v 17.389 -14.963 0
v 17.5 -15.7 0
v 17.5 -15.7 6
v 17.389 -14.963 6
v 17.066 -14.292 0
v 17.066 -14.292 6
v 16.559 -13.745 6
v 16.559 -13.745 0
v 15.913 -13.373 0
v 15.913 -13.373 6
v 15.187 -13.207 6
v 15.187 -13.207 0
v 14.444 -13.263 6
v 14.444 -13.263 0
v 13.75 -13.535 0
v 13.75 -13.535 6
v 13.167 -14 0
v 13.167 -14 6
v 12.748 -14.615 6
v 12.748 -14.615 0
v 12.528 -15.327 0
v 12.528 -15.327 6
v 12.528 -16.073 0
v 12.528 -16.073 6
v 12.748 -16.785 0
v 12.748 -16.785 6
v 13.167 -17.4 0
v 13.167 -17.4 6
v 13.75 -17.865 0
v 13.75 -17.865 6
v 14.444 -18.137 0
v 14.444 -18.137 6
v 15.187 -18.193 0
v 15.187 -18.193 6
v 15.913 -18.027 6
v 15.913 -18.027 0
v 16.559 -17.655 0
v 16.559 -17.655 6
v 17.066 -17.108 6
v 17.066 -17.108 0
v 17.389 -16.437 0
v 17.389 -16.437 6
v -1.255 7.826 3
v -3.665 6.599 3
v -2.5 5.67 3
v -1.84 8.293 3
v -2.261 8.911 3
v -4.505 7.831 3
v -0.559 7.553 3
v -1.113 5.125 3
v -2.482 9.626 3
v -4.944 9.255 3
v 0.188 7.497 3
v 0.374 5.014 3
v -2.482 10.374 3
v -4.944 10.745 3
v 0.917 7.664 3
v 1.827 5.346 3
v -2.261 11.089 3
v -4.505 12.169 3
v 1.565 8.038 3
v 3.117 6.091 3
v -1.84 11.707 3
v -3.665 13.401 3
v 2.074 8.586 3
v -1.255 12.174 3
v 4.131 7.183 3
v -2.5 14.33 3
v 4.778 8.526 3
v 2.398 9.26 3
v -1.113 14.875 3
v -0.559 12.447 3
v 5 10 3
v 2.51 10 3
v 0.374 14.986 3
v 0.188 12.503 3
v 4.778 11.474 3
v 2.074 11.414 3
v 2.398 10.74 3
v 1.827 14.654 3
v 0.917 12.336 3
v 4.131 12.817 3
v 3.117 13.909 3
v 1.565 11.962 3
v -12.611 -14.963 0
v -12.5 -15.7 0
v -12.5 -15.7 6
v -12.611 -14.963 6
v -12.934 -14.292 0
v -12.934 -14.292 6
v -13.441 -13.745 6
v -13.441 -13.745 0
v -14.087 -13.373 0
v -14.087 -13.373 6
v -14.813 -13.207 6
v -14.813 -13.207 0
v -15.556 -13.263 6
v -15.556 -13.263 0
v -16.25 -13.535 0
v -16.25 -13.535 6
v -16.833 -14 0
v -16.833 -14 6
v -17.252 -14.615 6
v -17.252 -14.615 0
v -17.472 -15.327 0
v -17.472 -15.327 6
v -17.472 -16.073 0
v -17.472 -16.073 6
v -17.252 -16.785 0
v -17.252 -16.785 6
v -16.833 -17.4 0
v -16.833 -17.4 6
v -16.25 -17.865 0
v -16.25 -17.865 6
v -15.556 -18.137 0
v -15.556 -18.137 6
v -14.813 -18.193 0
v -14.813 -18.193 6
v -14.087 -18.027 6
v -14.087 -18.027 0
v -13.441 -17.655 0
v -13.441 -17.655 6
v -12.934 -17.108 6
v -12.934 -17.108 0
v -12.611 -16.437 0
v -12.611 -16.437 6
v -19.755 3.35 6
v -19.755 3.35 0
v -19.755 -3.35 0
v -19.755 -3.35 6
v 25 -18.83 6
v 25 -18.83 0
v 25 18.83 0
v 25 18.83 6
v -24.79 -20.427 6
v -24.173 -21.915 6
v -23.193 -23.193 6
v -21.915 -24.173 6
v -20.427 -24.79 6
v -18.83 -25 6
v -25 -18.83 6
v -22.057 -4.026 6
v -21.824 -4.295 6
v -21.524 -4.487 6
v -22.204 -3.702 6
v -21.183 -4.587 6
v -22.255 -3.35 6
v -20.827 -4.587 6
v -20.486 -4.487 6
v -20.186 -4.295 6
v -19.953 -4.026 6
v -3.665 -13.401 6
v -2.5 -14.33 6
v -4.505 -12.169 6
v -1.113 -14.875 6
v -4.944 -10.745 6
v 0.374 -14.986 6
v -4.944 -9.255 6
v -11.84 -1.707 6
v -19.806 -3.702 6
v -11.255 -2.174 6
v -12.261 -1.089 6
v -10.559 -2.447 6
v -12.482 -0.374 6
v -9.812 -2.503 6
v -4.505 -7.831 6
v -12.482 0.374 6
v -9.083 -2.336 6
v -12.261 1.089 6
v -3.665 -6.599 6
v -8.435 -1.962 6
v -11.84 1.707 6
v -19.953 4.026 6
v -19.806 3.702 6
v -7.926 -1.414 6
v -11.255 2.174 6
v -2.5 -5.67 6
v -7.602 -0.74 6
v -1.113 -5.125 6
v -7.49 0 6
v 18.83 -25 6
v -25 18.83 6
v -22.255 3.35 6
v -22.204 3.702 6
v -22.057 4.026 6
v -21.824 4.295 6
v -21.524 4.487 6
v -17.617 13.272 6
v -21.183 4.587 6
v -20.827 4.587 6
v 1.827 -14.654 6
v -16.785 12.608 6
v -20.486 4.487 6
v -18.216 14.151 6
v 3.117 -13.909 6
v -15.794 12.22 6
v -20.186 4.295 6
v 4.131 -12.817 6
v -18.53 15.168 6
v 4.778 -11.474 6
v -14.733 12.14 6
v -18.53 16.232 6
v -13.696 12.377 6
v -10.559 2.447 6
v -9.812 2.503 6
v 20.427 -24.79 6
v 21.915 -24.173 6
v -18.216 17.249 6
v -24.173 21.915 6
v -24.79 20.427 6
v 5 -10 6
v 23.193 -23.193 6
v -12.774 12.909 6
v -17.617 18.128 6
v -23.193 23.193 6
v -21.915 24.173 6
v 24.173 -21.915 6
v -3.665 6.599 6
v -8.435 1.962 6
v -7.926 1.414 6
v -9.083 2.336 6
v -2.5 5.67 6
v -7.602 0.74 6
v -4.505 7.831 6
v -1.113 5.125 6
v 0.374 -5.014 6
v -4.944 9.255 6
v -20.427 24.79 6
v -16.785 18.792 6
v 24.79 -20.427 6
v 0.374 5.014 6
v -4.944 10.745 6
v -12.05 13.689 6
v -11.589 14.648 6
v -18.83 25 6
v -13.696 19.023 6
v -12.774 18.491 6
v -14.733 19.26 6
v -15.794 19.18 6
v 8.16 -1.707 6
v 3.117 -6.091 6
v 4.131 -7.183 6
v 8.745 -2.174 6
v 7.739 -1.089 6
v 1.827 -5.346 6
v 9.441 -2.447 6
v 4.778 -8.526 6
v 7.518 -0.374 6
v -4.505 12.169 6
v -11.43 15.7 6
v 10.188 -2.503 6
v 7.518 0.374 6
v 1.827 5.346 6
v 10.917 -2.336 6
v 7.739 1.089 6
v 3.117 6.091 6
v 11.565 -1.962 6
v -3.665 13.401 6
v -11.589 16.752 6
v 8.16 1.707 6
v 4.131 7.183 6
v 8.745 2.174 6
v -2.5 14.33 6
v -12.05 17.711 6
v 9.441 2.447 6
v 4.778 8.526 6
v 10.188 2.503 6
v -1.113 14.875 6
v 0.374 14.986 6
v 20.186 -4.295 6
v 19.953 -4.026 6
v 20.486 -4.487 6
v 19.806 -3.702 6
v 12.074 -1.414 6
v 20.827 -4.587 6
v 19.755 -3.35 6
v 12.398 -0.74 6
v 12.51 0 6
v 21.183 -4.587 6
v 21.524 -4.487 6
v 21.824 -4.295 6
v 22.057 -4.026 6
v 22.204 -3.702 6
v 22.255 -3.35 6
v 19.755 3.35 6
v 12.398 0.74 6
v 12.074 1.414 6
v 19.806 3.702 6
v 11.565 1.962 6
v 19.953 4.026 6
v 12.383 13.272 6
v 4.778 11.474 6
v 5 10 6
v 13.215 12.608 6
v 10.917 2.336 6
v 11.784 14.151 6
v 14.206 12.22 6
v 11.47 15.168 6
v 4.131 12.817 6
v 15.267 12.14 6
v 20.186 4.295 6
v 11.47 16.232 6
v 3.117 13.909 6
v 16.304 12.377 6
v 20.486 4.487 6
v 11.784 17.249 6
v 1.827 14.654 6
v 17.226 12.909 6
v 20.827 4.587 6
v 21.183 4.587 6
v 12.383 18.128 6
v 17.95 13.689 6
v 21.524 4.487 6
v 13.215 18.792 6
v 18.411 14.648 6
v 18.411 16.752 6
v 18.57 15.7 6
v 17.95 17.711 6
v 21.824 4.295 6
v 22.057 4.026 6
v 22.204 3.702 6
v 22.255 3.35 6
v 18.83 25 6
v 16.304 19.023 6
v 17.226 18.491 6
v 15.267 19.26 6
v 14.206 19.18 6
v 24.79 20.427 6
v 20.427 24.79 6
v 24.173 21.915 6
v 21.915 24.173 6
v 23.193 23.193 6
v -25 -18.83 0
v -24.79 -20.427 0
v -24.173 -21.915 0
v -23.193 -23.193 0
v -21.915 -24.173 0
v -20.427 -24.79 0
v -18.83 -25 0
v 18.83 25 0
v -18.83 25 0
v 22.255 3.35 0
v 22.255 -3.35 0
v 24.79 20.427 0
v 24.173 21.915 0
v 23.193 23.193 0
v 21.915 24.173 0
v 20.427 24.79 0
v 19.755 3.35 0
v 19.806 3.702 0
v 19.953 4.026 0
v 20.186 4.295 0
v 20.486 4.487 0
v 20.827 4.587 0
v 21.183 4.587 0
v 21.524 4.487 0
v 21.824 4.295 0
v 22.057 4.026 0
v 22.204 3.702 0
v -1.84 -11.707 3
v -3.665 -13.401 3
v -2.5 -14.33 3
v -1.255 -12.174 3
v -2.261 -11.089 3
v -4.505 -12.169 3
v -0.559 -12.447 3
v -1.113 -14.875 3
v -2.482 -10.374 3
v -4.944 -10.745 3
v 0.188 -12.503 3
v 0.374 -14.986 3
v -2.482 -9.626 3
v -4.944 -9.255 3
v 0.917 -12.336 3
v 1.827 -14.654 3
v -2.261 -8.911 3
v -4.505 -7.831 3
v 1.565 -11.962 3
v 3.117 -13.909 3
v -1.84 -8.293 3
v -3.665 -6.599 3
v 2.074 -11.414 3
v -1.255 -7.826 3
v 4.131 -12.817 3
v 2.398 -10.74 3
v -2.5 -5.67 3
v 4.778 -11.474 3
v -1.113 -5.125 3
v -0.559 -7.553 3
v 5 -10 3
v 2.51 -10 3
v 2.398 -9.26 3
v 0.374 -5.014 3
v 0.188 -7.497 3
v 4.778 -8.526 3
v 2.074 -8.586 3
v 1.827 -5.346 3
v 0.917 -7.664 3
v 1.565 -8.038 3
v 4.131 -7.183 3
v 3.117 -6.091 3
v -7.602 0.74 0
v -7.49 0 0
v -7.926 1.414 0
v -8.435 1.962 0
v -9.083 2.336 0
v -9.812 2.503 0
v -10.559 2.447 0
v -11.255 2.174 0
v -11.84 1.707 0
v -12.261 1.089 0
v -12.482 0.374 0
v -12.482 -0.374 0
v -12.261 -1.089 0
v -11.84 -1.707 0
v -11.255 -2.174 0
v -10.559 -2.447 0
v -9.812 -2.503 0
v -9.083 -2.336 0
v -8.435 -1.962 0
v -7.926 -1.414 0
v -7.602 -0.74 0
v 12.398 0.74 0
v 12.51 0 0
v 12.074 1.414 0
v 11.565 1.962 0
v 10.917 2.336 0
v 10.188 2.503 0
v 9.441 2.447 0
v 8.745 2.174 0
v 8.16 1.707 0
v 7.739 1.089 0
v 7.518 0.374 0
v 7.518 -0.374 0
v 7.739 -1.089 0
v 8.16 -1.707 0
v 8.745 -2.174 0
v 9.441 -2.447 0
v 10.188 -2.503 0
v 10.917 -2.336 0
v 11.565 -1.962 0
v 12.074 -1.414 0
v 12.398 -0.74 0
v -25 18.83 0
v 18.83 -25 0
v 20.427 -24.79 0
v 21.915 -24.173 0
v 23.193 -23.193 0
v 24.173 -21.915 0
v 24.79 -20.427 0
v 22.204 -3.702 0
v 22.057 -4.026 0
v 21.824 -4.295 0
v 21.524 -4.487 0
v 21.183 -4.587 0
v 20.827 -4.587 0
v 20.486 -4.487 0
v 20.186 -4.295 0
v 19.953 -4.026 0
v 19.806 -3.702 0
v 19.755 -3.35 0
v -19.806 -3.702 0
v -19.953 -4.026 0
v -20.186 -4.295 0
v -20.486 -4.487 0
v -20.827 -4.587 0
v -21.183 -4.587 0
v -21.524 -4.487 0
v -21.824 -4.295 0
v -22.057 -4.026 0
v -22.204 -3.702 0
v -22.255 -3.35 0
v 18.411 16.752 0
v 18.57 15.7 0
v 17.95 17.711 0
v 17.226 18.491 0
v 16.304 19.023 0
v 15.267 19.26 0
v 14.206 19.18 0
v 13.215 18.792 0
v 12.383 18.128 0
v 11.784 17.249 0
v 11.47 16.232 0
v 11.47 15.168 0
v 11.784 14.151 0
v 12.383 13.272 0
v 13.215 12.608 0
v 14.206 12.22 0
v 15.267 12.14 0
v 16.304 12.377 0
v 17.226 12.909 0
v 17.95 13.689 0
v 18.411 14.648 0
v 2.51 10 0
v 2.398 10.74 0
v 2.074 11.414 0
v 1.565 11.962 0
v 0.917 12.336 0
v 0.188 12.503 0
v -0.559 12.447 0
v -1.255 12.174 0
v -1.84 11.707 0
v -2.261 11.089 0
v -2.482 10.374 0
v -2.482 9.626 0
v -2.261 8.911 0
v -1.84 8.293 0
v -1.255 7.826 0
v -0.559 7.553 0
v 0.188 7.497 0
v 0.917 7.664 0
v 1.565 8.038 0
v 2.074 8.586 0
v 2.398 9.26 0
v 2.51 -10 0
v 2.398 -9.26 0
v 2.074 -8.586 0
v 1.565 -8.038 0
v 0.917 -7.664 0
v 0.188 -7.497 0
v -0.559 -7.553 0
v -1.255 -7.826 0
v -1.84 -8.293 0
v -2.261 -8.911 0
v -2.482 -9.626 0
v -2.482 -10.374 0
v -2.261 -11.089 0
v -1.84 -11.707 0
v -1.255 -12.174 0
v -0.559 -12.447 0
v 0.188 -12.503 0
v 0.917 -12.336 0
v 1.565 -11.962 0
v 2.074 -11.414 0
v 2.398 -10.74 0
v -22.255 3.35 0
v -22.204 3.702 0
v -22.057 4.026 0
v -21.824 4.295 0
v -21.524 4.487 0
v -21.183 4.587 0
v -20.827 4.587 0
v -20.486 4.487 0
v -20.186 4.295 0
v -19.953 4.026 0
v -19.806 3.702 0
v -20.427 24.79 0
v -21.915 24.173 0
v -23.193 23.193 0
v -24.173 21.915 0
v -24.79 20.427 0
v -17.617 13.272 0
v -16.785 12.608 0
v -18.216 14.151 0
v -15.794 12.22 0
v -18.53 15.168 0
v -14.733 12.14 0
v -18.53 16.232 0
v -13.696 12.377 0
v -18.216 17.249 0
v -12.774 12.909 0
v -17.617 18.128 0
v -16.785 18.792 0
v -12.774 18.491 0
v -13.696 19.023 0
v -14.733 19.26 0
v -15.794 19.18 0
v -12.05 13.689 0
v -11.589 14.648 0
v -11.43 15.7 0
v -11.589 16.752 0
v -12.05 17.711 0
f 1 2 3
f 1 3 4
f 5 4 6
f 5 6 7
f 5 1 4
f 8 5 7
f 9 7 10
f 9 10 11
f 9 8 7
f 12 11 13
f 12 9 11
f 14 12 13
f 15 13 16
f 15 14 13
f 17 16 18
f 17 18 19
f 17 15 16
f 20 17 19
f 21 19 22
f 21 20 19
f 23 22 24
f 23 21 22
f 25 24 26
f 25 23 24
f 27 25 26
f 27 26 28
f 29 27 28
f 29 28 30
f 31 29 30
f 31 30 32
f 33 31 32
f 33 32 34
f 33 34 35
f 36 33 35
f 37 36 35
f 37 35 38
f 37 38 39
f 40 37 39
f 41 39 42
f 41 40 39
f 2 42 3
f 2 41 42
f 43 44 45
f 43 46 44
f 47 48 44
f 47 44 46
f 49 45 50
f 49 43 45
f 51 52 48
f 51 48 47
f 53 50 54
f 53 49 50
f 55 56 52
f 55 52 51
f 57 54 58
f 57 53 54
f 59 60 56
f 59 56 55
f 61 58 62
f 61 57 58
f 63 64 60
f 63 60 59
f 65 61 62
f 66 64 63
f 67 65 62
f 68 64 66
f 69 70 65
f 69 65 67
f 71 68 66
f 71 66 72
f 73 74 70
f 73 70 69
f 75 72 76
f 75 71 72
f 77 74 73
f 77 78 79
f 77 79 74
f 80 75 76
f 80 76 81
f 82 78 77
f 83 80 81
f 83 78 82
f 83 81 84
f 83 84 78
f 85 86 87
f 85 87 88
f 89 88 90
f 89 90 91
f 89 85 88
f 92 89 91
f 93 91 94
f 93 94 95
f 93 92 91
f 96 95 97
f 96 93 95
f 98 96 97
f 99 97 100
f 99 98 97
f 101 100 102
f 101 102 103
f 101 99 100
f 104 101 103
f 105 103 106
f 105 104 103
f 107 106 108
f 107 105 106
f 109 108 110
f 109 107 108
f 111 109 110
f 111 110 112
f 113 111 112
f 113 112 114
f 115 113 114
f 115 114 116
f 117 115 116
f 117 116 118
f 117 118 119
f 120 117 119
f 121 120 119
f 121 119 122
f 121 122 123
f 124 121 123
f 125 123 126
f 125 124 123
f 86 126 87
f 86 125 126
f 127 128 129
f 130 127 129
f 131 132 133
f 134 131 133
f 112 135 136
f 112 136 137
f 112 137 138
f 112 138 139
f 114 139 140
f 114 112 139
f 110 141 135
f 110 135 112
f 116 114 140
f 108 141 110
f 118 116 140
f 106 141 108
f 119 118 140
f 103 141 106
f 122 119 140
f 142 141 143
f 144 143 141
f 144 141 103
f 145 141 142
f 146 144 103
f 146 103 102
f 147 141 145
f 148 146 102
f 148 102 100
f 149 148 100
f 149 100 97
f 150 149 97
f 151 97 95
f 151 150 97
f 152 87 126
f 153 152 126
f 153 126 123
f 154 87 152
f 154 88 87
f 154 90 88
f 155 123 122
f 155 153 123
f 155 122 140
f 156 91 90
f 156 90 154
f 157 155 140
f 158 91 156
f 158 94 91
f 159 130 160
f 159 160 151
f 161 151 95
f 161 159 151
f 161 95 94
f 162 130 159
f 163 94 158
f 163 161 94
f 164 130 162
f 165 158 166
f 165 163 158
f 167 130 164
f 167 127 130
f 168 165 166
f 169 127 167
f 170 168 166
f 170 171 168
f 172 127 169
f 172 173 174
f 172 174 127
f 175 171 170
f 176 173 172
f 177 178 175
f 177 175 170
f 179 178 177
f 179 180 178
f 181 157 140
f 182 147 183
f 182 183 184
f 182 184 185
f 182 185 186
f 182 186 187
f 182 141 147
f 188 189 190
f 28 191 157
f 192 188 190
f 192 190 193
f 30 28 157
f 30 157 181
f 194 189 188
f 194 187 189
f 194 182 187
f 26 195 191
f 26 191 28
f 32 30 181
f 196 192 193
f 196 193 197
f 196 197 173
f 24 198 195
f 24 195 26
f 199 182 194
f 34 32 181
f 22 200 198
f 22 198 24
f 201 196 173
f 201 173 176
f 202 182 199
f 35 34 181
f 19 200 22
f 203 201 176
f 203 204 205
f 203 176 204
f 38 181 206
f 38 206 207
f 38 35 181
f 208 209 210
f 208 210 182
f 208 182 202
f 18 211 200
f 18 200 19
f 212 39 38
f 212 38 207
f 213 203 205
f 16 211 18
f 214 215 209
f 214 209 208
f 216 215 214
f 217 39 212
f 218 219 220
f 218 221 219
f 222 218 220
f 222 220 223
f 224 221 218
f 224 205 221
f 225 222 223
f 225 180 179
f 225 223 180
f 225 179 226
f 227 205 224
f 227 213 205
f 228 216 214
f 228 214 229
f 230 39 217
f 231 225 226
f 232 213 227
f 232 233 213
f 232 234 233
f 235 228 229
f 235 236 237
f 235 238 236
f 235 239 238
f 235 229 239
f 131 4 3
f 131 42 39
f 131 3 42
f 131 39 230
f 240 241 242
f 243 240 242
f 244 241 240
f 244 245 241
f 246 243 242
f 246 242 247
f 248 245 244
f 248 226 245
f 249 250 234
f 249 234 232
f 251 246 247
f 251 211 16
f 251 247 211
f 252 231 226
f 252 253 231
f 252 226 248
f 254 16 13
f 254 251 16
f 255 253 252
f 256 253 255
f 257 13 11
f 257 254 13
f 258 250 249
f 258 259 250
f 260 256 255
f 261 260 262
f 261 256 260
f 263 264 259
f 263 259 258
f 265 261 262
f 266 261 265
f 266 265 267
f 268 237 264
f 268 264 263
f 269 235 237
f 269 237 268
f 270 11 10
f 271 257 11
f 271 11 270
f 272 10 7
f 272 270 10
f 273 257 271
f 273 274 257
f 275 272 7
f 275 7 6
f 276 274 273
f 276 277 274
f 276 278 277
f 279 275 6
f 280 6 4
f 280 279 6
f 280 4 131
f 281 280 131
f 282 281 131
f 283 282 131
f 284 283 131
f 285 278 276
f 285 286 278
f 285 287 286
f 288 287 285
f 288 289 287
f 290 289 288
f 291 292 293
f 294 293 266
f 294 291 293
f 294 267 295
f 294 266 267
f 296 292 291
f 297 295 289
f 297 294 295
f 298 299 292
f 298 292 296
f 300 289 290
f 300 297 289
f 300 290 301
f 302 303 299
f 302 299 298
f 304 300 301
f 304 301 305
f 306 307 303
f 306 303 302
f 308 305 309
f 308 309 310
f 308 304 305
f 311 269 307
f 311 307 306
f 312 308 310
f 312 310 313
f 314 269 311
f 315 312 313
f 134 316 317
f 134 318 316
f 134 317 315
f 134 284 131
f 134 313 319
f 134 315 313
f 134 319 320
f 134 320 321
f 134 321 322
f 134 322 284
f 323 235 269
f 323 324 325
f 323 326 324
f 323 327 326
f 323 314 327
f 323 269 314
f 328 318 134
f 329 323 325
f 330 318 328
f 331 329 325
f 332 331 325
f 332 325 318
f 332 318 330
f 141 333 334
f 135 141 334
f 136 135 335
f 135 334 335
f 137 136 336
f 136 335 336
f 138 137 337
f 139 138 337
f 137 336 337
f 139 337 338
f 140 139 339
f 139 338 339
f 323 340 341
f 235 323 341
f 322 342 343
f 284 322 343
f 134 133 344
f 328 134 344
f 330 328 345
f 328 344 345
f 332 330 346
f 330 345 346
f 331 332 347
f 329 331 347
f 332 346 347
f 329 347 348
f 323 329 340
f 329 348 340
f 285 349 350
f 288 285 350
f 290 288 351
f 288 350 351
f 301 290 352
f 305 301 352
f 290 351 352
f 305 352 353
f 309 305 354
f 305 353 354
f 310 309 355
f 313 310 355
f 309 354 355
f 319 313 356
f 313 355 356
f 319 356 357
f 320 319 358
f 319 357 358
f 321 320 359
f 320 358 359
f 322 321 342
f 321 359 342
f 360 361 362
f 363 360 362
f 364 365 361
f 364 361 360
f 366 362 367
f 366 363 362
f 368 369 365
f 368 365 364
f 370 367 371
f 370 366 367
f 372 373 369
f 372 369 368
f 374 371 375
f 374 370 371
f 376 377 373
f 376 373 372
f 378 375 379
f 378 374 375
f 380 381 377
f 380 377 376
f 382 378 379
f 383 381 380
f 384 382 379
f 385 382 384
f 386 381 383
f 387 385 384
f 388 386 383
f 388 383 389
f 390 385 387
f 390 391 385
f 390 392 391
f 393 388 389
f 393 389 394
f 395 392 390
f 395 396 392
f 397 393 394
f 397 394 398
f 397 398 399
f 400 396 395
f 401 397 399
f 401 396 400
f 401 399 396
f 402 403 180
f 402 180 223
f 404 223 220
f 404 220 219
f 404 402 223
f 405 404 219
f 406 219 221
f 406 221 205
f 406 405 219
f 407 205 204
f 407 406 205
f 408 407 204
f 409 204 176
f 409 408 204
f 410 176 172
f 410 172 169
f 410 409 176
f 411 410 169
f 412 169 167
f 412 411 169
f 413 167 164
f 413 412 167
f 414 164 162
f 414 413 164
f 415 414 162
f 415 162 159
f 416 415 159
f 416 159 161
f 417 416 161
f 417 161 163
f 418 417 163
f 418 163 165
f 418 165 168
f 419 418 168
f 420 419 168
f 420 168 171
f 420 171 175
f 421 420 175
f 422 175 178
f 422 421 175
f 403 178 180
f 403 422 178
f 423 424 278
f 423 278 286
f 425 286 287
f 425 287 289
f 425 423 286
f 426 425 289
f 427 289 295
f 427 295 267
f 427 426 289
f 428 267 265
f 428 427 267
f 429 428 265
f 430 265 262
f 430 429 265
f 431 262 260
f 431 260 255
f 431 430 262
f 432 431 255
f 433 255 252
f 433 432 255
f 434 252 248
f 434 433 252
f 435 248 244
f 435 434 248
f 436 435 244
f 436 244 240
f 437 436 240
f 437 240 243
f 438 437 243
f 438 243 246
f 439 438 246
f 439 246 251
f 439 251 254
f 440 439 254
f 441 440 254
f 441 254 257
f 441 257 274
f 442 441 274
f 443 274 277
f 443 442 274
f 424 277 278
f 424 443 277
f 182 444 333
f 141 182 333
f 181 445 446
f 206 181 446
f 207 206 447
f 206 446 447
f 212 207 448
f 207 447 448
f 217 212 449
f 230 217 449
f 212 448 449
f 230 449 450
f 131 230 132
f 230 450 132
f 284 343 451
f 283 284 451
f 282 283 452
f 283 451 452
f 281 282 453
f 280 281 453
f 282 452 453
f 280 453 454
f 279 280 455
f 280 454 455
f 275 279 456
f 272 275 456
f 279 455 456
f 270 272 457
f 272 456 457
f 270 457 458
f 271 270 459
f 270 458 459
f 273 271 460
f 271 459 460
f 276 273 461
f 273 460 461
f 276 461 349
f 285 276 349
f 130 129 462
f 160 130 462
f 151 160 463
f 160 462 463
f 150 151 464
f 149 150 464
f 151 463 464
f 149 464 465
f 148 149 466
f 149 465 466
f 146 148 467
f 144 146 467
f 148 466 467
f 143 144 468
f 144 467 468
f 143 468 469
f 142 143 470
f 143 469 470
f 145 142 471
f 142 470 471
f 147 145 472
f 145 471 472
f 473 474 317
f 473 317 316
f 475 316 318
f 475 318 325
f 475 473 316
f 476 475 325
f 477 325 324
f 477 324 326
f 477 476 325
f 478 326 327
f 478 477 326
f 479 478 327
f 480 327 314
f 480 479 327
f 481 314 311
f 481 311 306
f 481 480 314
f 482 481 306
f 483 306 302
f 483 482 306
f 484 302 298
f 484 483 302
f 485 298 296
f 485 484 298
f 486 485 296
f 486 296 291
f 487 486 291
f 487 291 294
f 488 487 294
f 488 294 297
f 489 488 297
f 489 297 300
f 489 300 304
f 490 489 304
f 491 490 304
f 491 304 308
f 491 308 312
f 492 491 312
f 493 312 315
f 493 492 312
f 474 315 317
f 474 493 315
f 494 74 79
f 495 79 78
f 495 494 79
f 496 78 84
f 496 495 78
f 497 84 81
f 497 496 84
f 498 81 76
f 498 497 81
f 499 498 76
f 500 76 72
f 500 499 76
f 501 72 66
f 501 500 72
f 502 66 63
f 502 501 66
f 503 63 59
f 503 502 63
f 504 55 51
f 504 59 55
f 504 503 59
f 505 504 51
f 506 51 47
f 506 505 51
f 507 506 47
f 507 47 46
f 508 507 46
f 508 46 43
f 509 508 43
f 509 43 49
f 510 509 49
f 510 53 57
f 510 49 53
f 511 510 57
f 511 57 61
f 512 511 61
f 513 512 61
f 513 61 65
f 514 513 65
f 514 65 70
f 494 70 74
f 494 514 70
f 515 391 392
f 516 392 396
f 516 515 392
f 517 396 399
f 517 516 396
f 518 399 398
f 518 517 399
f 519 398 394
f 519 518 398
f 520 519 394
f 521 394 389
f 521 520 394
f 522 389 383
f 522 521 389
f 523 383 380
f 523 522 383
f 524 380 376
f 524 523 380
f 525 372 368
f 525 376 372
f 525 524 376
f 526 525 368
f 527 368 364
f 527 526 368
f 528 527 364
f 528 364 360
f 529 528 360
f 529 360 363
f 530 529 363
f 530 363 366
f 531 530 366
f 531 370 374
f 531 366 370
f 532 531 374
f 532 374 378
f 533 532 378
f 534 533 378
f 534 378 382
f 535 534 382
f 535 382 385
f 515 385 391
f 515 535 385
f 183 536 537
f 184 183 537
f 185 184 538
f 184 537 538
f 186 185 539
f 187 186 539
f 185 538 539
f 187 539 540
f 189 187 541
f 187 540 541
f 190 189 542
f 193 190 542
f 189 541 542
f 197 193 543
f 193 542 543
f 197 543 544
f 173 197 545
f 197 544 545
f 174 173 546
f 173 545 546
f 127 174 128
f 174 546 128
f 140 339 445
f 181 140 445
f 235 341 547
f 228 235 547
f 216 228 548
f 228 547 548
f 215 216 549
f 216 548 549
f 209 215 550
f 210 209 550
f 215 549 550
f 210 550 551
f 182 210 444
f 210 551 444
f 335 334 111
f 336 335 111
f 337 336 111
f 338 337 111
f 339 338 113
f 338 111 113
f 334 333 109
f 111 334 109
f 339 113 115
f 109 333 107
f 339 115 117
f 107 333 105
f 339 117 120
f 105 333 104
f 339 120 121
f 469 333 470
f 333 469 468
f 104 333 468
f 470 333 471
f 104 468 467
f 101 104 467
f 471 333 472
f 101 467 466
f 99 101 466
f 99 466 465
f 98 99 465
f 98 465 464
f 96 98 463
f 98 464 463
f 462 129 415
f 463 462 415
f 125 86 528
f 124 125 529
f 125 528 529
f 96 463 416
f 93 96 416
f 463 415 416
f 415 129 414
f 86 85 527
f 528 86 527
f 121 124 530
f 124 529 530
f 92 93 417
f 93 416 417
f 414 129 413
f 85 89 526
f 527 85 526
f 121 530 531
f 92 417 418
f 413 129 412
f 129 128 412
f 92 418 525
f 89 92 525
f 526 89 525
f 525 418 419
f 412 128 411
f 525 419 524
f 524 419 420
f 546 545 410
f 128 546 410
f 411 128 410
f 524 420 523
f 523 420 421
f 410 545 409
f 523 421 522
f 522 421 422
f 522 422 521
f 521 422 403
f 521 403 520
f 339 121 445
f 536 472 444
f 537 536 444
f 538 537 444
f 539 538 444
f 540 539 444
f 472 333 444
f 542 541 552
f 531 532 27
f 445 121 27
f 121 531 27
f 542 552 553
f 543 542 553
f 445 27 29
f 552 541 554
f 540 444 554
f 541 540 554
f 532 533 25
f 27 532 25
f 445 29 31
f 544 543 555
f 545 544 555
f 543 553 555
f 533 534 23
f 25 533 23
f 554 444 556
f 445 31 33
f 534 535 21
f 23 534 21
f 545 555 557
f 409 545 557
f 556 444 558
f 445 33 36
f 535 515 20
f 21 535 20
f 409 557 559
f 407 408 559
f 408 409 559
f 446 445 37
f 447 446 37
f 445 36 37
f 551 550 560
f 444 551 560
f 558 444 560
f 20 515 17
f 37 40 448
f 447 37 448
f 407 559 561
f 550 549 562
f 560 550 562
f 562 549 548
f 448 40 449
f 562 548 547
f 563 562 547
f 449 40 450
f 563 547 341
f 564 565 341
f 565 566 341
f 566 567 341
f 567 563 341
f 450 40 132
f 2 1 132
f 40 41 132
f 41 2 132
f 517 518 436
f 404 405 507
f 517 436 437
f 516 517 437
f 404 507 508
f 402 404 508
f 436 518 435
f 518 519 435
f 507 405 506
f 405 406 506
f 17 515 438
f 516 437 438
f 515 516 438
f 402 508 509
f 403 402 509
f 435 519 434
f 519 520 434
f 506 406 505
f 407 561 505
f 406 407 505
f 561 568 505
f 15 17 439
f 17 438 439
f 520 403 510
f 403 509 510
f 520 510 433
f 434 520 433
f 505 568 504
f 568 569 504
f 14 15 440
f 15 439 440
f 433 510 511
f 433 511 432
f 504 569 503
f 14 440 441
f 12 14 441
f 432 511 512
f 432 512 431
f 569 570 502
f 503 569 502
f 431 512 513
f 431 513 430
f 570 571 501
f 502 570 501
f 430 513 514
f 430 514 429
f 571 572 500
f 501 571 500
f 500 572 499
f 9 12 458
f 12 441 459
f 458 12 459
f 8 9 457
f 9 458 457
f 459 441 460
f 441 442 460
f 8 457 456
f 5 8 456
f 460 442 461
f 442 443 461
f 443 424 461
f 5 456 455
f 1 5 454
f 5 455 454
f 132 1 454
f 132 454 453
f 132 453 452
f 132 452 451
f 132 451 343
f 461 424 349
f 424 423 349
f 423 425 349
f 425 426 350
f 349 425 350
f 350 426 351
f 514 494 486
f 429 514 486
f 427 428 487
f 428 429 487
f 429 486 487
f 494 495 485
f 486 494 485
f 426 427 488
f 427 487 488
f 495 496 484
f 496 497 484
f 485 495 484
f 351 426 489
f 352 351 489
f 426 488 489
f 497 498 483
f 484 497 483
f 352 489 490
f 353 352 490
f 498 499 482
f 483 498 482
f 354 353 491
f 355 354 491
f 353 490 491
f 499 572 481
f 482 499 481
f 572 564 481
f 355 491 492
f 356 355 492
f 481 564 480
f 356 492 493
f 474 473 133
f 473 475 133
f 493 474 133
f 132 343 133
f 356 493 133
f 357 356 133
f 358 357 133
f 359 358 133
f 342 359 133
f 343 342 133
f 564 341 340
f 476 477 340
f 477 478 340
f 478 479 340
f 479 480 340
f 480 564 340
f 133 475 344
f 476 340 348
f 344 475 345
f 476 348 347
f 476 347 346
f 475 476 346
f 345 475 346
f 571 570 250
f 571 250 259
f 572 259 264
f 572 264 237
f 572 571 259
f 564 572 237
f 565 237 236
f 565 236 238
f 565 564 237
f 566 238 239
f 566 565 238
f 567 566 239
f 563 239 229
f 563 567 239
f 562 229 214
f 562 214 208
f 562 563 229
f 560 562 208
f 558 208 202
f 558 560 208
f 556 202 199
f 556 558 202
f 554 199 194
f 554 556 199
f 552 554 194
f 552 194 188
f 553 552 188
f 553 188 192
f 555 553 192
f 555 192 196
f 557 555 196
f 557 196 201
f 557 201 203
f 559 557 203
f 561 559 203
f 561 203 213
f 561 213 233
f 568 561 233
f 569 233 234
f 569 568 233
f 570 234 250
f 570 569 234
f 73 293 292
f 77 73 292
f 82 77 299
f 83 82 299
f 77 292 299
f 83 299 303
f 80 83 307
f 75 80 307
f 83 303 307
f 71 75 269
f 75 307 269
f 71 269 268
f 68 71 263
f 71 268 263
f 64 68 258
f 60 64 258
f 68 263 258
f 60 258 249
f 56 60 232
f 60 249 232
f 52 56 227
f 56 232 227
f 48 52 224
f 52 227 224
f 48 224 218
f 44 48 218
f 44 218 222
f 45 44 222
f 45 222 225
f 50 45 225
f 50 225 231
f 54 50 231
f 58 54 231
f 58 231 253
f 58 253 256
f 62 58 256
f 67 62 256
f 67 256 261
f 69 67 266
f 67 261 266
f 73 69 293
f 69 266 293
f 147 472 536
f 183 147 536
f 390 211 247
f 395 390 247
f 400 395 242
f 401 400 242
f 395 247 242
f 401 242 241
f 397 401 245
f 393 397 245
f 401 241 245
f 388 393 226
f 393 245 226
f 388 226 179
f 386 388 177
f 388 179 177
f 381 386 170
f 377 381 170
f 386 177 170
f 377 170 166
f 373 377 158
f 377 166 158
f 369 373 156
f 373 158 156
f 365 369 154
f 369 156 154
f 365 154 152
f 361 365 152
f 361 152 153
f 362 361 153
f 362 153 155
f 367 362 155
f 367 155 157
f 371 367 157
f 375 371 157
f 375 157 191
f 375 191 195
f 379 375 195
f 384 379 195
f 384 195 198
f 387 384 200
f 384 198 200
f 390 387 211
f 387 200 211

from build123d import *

# Parameters (mm, degrees)
F0_R     = 2.5
F0_R_2   = 2.51
F0_R_3   = 3.57
F1_DEPTH = 6
F2_R     = 5
F3_DEPTH = 3


with BuildPart() as f1:
    # F0 (on Top) → F1 (new body)
    with BuildSketch(Plane.XY):
        with BuildLine():
            Line((18.83, 25), (-18.83, 25))
            ThreePointArc((-18.83, 25), (-23.192849, 23.192849), (-25, 18.83))
            Line((-25, 18.83), (-25, -18.83))
            ThreePointArc((-25, -18.83), (-23.192849, -23.192849), (-18.83, -25))
            Line((-18.83, -25), (18.83, -25))
            ThreePointArc((18.83, -25), (23.192849, -23.192849), (25, -18.83))
            Line((25, -18.83), (25, 18.83))
            ThreePointArc((25, 18.83), (23.192849, 23.192849), (18.83, 25))
        make_face()
        with Locations((-15, -15.7)):
            Circle(F0_R, mode=Mode.SUBTRACT)
        with Locations((15, -15.7)):
            Circle(F0_R, mode=Mode.SUBTRACT)
        with Locations((0, -10)):
            Circle(F0_R_2, mode=Mode.SUBTRACT)
        with BuildLine():
            Line((-22.255, -3.35), (-22.255, 3.35))
            ThreePointArc((-22.255, 3.35), (-21.005, 4.6), (-19.755, 3.35))
            Line((-19.755, 3.35), (-19.755, -3.35))
            ThreePointArc((-19.755, -3.35), (-21.005, -4.6), (-22.255, -3.35))
        make_face(mode=Mode.SUBTRACT)
        with Locations((-10, 0)):
            Circle(F0_R_2, mode=Mode.SUBTRACT)
        with Locations((-15, 15.7)):
            Circle(F0_R_3, mode=Mode.SUBTRACT)
        with Locations((10, 0)):
            Circle(F0_R_2, mode=Mode.SUBTRACT)
        with Locations((0, 10)):
            Circle(F0_R_2, mode=Mode.SUBTRACT)
        with BuildLine():
            Line((19.755, -3.35), (19.755, 3.35))
            ThreePointArc((19.755, 3.35), (21.005, 4.6), (22.255, 3.35))
            Line((22.255, 3.35), (22.255, -3.35))
            ThreePointArc((22.255, -3.35), (21.005, -4.6), (19.755, -3.35))
        make_face(mode=Mode.SUBTRACT)
        with Locations((15, 15.7)):
            Circle(F0_R_3, mode=Mode.SUBTRACT)
    extrude(amount=F1_DEPTH)

    # F2 (on face) → F3 (cut)
    with BuildSketch(Plane.XY.offset(6)):
        with Locations((0, 10)):
            Circle(F2_R)
        with Locations((0, -10)):
            Circle(F2_R)
    extrude(amount=-F3_DEPTH, mode=Mode.SUBTRACT)


solid = f1.part
